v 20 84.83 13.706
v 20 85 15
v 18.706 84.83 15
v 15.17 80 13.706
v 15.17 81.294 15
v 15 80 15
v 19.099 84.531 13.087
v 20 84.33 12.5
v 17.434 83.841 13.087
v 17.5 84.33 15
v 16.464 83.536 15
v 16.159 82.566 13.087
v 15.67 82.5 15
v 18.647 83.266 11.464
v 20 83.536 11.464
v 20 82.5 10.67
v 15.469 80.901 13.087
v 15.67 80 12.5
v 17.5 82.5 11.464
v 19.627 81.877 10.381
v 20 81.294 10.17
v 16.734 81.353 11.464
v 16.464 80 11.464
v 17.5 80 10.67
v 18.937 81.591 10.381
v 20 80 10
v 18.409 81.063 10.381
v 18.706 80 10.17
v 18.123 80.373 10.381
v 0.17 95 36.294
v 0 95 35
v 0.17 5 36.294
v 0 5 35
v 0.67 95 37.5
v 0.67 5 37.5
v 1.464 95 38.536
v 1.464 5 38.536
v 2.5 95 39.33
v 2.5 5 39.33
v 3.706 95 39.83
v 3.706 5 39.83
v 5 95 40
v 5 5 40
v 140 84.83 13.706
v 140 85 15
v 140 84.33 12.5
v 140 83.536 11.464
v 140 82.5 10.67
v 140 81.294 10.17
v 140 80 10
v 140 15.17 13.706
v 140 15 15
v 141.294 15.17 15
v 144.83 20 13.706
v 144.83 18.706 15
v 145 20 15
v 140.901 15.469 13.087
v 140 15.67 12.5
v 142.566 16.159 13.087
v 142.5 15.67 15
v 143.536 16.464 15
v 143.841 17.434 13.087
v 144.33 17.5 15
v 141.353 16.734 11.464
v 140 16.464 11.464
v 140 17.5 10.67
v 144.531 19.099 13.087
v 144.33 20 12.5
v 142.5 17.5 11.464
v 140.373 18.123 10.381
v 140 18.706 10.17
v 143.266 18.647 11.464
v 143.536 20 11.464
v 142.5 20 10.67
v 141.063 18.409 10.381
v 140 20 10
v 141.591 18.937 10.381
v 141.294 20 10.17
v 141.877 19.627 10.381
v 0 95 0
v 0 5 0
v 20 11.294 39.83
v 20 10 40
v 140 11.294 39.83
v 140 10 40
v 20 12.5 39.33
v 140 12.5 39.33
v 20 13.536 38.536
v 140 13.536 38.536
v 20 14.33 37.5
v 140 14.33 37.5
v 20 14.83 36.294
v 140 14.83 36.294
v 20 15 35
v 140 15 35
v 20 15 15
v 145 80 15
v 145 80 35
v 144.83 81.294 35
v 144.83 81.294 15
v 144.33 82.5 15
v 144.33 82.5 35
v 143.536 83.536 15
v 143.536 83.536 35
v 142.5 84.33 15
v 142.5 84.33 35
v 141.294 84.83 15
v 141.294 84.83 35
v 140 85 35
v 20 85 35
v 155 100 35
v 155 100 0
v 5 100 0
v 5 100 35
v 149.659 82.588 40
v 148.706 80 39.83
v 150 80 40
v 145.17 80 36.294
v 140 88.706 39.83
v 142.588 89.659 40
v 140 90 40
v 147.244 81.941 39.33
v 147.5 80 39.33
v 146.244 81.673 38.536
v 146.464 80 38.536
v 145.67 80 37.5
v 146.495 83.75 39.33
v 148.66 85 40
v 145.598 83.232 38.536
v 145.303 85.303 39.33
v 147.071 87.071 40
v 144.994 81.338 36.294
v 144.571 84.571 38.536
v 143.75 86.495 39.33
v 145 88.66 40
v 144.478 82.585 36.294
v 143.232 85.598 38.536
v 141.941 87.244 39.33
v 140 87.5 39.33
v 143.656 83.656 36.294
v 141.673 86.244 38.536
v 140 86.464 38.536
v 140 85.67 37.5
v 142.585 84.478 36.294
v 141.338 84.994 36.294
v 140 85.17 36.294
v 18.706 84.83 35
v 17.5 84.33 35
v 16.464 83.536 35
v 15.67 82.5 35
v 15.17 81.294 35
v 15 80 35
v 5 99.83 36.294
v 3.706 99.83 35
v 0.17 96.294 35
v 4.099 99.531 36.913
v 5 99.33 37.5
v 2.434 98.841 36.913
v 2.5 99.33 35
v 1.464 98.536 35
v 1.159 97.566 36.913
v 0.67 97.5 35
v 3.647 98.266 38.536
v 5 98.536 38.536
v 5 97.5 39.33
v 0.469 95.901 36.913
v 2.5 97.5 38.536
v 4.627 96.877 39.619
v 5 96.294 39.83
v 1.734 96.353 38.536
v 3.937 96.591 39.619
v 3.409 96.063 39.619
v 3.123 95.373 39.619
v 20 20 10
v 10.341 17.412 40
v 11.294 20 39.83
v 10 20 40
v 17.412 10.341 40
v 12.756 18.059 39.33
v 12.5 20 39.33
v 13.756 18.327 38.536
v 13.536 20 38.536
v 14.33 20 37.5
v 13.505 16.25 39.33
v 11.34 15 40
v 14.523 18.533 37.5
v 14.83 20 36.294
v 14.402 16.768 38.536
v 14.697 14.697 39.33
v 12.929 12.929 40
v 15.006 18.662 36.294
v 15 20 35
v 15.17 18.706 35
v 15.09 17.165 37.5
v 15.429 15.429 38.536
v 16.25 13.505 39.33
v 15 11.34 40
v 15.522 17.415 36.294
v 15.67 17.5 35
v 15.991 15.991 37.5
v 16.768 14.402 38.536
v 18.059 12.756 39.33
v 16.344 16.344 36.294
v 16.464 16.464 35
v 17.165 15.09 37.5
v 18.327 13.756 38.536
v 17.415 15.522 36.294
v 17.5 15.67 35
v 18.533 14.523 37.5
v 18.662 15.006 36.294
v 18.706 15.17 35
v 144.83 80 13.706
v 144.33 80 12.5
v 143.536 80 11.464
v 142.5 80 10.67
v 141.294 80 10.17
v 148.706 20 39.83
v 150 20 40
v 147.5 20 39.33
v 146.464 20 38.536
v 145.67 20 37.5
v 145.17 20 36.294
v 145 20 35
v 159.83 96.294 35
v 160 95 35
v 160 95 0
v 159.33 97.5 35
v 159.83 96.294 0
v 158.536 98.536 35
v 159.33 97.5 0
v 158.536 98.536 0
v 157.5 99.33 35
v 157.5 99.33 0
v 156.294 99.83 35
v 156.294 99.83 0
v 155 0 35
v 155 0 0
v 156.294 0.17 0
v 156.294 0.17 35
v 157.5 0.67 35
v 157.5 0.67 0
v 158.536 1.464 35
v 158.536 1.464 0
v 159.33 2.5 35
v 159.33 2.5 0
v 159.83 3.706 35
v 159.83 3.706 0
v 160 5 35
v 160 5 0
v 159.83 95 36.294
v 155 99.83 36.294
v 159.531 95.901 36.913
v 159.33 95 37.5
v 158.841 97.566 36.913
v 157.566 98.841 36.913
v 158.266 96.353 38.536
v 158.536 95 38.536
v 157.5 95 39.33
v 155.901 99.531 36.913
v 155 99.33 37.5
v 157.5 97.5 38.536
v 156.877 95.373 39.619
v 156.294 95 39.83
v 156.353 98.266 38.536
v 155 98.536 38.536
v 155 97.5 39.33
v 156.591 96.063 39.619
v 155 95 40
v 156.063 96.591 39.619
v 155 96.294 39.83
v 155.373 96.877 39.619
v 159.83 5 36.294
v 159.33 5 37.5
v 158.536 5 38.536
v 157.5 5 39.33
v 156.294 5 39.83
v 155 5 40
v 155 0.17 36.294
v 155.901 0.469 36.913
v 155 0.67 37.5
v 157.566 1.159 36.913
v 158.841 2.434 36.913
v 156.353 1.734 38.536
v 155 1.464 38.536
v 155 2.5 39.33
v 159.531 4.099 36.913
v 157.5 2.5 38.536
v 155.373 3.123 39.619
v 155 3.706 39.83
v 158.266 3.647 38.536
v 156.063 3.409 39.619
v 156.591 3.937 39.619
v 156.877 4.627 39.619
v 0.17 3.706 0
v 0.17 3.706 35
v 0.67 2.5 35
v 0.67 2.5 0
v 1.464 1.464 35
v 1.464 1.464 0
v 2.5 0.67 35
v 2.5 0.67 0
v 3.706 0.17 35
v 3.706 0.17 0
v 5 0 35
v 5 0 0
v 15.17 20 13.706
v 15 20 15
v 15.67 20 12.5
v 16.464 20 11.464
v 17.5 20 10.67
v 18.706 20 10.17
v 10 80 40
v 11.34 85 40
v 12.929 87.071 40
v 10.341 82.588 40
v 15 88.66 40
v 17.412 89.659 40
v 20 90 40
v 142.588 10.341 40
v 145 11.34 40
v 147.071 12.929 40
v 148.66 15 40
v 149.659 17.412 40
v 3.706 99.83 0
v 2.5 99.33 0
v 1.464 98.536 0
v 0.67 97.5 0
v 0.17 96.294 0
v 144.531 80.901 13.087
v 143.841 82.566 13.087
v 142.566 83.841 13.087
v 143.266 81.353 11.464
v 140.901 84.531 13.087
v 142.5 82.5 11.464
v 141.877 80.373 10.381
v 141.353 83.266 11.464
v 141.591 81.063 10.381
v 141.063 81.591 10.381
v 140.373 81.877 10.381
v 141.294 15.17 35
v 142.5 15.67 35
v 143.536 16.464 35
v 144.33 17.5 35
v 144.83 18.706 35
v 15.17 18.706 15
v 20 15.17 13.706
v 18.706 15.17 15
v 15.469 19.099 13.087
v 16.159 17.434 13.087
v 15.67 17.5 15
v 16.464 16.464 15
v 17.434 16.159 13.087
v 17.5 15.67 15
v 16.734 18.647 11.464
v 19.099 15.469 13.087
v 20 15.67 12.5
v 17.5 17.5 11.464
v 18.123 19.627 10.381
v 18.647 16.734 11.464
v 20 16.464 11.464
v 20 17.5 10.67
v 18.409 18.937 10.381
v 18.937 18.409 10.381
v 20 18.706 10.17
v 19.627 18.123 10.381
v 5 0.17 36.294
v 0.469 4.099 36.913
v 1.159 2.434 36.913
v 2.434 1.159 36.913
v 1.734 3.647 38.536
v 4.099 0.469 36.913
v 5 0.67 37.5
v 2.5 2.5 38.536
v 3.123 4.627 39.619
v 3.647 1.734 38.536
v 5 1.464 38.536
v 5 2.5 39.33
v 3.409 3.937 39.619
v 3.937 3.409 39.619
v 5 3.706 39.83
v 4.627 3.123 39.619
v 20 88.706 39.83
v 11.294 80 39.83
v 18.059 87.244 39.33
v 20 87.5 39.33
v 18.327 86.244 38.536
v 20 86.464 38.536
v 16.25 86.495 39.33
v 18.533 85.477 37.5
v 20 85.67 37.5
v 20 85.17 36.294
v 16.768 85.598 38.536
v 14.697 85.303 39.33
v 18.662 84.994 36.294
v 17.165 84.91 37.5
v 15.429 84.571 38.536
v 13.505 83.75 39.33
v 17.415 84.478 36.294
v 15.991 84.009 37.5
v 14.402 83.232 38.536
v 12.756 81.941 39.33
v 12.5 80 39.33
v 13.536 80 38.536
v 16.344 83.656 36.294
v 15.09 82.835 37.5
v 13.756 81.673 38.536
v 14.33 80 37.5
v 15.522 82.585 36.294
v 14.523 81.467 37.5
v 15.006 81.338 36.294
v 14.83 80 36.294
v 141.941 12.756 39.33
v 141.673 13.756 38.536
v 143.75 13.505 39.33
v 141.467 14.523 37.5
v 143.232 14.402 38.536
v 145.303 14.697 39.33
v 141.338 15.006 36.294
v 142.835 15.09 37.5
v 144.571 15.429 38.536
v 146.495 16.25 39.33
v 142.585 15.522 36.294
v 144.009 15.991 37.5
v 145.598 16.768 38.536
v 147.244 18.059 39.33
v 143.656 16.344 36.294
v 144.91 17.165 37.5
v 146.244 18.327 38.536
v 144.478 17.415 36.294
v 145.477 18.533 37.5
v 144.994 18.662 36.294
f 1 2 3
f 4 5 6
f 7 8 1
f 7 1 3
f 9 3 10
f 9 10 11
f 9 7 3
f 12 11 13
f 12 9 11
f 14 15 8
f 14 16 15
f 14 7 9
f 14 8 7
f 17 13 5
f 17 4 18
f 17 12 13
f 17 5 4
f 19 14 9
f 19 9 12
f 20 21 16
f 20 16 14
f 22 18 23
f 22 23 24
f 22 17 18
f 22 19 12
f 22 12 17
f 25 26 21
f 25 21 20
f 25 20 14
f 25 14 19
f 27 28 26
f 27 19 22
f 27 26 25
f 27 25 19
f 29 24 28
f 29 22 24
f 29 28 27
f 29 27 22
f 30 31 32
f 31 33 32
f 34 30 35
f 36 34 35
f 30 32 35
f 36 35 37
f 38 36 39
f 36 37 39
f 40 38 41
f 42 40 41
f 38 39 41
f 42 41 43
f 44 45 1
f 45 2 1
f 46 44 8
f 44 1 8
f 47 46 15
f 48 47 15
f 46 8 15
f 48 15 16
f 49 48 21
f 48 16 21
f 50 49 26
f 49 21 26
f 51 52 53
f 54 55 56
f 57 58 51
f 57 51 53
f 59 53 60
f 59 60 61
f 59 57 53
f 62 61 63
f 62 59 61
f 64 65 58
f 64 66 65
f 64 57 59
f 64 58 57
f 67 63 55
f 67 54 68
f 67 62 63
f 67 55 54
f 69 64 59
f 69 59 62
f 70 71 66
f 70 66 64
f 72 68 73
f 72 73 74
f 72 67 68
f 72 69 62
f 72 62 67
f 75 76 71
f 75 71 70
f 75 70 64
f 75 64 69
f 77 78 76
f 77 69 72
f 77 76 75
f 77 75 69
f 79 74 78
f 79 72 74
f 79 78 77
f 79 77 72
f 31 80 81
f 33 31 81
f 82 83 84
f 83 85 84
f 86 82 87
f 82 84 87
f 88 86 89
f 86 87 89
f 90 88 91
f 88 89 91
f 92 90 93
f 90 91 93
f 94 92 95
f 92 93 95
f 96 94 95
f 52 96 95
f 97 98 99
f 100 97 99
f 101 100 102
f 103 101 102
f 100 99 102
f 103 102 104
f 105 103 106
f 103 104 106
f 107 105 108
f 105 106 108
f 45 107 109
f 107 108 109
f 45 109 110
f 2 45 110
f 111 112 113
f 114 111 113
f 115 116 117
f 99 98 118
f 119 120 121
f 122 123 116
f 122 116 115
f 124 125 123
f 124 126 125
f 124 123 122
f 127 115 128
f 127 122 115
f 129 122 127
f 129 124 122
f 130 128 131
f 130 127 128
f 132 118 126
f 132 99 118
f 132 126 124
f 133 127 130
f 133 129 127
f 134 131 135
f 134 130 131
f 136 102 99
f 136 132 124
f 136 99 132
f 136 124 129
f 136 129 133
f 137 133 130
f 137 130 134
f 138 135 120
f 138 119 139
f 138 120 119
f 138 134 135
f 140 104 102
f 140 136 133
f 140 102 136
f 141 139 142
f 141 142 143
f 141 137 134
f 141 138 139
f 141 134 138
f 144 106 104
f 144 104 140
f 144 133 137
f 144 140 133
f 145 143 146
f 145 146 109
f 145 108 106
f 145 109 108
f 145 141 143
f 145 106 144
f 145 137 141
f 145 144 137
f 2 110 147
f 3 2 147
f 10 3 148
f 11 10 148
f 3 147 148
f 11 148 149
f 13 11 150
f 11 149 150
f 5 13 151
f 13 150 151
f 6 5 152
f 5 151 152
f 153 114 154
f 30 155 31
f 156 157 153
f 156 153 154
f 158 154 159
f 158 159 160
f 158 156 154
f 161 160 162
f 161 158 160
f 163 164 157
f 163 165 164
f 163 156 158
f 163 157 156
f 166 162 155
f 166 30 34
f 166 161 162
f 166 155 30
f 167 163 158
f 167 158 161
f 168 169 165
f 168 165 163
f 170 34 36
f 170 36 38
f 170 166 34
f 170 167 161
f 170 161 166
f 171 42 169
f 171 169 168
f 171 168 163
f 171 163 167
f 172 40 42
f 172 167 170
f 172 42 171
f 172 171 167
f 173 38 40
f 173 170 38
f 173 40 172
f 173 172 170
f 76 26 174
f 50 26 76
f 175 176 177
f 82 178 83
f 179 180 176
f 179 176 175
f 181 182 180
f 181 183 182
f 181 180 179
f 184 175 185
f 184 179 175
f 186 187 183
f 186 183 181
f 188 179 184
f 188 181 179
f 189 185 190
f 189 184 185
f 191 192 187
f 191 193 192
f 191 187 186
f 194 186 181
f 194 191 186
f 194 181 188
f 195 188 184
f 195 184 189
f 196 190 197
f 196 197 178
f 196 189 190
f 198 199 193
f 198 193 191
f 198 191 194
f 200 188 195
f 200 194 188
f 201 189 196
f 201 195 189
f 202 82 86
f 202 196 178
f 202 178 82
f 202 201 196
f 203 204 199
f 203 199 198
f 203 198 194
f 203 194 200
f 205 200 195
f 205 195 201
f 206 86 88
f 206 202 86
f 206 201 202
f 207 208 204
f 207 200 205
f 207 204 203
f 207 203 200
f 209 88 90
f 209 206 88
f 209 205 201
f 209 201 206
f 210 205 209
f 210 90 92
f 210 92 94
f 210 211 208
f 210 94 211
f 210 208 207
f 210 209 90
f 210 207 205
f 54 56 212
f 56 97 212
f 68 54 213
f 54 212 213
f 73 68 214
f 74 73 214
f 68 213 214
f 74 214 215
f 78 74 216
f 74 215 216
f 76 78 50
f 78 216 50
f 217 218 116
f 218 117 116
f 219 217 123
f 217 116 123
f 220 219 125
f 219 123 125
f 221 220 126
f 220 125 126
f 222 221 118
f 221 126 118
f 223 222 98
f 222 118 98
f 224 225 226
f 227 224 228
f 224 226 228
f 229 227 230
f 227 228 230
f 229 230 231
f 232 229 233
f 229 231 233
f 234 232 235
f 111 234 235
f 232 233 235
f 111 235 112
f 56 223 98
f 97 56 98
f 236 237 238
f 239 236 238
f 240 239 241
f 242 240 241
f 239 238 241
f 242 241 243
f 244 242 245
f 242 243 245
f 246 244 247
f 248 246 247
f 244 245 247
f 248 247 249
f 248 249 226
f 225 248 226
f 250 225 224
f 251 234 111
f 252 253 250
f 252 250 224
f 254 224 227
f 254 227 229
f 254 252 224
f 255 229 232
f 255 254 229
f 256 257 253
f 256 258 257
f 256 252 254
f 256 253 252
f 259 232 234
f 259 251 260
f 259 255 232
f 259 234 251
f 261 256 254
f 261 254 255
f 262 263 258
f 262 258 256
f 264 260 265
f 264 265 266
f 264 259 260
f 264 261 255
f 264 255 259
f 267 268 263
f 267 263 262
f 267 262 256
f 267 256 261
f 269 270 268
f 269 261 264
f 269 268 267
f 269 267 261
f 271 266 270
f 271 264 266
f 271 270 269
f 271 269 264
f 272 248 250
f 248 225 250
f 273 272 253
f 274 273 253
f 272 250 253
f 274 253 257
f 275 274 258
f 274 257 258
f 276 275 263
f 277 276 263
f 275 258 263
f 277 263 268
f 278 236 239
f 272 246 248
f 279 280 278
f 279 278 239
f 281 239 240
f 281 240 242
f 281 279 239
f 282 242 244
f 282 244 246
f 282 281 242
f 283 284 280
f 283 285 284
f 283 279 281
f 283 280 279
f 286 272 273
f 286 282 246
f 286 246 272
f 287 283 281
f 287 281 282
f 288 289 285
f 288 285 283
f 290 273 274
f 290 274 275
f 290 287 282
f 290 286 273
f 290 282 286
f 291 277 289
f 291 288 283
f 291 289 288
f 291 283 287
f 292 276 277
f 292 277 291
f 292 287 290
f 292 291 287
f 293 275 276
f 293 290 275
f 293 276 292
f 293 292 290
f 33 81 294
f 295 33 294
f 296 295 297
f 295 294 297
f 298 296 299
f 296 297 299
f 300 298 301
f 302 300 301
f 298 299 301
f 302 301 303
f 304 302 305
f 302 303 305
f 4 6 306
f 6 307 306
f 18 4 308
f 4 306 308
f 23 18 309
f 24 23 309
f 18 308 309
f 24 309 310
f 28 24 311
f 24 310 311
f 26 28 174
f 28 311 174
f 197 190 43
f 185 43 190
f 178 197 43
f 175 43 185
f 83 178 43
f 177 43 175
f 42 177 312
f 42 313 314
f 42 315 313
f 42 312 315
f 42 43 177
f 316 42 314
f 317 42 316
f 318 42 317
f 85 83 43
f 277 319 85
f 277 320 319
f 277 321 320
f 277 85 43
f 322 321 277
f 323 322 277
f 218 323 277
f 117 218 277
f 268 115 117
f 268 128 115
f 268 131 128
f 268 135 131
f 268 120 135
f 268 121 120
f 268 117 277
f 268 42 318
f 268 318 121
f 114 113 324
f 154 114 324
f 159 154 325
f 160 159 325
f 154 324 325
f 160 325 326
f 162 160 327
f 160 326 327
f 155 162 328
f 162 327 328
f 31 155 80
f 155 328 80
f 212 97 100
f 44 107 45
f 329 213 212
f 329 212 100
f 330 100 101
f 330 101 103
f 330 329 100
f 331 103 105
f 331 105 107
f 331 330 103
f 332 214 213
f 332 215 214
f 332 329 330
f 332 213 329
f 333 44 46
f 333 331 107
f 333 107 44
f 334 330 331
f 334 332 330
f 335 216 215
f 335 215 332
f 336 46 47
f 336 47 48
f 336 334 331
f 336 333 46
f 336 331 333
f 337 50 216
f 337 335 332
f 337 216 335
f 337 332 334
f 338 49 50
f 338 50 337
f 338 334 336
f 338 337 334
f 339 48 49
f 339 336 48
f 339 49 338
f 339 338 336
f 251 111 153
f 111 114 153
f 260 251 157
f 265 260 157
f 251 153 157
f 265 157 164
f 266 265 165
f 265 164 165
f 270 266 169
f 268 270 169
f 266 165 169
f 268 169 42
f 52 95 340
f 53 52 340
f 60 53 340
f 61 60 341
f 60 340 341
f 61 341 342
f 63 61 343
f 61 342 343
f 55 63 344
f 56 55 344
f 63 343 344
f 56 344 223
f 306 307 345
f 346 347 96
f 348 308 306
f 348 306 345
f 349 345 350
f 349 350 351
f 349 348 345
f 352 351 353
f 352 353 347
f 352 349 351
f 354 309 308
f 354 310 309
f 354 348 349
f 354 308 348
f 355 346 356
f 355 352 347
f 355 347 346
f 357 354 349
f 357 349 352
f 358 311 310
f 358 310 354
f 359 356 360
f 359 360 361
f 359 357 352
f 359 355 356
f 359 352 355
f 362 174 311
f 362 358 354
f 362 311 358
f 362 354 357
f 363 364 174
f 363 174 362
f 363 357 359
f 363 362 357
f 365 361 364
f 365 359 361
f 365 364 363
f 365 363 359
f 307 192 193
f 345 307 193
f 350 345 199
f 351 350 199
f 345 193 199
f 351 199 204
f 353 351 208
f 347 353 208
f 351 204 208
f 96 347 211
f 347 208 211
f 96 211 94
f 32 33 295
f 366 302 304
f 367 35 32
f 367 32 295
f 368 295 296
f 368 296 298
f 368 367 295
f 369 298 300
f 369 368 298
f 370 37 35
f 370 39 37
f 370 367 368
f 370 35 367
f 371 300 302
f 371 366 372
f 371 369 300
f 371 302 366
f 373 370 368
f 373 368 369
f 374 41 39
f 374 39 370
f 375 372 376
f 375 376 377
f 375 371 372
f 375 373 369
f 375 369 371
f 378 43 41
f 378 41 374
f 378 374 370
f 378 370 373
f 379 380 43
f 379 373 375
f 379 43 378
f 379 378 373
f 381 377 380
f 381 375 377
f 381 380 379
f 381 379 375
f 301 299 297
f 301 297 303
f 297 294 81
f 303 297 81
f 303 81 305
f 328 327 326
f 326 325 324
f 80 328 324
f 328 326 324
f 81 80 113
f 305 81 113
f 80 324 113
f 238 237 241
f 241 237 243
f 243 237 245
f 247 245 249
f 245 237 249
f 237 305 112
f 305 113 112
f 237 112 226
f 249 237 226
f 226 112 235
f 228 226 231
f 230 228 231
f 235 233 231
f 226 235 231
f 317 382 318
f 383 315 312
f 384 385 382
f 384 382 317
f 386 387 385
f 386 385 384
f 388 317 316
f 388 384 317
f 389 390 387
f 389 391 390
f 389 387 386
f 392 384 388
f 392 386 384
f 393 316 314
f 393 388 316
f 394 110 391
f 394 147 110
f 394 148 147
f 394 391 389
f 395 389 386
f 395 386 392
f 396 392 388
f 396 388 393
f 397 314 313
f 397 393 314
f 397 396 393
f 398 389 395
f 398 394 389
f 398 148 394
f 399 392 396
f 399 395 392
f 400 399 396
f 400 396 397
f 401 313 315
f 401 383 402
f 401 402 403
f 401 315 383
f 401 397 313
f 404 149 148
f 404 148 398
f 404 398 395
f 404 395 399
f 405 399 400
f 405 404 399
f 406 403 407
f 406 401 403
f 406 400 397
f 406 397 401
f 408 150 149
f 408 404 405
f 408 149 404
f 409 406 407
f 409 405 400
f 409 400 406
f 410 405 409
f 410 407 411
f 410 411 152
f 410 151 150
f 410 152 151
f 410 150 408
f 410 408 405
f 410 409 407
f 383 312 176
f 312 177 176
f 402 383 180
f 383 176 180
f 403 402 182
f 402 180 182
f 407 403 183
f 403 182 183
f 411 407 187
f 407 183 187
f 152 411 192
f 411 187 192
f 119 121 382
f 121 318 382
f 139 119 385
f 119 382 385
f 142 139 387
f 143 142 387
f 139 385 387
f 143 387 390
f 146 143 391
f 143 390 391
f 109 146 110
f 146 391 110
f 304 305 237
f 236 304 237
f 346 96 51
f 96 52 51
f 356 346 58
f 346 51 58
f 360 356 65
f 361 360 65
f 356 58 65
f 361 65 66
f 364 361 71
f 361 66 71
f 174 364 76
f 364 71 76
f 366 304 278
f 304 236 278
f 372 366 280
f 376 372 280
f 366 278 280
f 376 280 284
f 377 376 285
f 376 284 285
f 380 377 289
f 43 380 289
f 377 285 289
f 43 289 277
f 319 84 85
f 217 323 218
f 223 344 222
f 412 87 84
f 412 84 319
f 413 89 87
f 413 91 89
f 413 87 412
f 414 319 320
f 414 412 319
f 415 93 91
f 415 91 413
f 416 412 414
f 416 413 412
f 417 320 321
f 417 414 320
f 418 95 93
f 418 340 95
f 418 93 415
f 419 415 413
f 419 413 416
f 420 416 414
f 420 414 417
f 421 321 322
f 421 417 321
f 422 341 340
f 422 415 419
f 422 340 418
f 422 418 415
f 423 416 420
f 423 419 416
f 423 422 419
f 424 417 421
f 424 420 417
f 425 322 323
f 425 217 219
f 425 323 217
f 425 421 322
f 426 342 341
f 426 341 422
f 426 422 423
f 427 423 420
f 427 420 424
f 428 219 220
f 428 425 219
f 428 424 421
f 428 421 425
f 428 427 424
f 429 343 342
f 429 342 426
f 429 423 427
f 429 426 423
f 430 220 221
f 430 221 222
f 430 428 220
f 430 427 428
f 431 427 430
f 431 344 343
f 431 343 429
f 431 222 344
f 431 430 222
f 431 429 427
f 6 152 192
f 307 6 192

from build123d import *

# Parameters (mm, degrees)
F1_DEPTH = 40
F3_DEPTH = 30
F4_R     = 5


with BuildPart() as f1:
    # F0 (on Top) → F1 (new body)
    with BuildSketch(Plane.XY):
        with BuildLine():
            ThreePointArc((0, 5), (1.4644660941, 1.4644660941), (5, 0))
            Line((5, 0), (155, 0))
            ThreePointArc((155, 0), (158.5355339059, 1.4644660941), (160, 5))
            Line((160, 5), (160, 95))
            ThreePointArc((160, 95), (158.5355339059, 98.5355339059), (155, 100))
            Line((155, 100), (5, 100))
            ThreePointArc((5, 100), (1.4644660941, 98.5355339059), (0, 95))
            Line((0, 95), (0, 5))
        make_face()
    extrude(amount=F1_DEPTH)

    # F2 (on face) → F3 (cut)
    with BuildSketch(Plane.XY.offset(40)):
        with BuildLine():
            Line((140, 85), (20, 85))
            ThreePointArc((20, 85), (16.4644660941, 83.5355339059), (15, 80))
            Line((15, 80), (15, 20))
            ThreePointArc((15, 20), (16.4644660941, 16.4644660941), (20, 15))
            Line((20, 15), (140, 15))
            ThreePointArc((140, 15), (143.5355339059, 16.4644660941), (145, 20))
            Line((145, 20), (145, 80))
            ThreePointArc((145, 80), (143.5355339059, 83.5355339059), (140, 85))
        make_face()
    extrude(amount=-F3_DEPTH, mode=Mode.SUBTRACT)

    # F4
    f4_edges = [f1.edges().sort_by_distance(p)[0] for p in [
        (80, 85, 10),
        (0, 50, 40),
        (1.464466, 98.535534, 40),
        (1.464466, 1.464466, 40),
        (80, 100, 40),
        (80, 0, 40),
        (158.535534, 98.535534, 40),
        (158.535534, 1.464466, 40),
        (160, 50, 40),
        (80, 85, 40),
        (16.464466, 83.535534, 40),
        (15, 50, 40),
        (16.464466, 16.464466, 40),
        (80, 15, 40),
        (143.535534, 16.464466, 40),
        (145, 50, 40),
        (143.535534, 83.535534, 40),
    ]]
    fillet(f4_edges, radius=F4_R)


solid = f1.part
